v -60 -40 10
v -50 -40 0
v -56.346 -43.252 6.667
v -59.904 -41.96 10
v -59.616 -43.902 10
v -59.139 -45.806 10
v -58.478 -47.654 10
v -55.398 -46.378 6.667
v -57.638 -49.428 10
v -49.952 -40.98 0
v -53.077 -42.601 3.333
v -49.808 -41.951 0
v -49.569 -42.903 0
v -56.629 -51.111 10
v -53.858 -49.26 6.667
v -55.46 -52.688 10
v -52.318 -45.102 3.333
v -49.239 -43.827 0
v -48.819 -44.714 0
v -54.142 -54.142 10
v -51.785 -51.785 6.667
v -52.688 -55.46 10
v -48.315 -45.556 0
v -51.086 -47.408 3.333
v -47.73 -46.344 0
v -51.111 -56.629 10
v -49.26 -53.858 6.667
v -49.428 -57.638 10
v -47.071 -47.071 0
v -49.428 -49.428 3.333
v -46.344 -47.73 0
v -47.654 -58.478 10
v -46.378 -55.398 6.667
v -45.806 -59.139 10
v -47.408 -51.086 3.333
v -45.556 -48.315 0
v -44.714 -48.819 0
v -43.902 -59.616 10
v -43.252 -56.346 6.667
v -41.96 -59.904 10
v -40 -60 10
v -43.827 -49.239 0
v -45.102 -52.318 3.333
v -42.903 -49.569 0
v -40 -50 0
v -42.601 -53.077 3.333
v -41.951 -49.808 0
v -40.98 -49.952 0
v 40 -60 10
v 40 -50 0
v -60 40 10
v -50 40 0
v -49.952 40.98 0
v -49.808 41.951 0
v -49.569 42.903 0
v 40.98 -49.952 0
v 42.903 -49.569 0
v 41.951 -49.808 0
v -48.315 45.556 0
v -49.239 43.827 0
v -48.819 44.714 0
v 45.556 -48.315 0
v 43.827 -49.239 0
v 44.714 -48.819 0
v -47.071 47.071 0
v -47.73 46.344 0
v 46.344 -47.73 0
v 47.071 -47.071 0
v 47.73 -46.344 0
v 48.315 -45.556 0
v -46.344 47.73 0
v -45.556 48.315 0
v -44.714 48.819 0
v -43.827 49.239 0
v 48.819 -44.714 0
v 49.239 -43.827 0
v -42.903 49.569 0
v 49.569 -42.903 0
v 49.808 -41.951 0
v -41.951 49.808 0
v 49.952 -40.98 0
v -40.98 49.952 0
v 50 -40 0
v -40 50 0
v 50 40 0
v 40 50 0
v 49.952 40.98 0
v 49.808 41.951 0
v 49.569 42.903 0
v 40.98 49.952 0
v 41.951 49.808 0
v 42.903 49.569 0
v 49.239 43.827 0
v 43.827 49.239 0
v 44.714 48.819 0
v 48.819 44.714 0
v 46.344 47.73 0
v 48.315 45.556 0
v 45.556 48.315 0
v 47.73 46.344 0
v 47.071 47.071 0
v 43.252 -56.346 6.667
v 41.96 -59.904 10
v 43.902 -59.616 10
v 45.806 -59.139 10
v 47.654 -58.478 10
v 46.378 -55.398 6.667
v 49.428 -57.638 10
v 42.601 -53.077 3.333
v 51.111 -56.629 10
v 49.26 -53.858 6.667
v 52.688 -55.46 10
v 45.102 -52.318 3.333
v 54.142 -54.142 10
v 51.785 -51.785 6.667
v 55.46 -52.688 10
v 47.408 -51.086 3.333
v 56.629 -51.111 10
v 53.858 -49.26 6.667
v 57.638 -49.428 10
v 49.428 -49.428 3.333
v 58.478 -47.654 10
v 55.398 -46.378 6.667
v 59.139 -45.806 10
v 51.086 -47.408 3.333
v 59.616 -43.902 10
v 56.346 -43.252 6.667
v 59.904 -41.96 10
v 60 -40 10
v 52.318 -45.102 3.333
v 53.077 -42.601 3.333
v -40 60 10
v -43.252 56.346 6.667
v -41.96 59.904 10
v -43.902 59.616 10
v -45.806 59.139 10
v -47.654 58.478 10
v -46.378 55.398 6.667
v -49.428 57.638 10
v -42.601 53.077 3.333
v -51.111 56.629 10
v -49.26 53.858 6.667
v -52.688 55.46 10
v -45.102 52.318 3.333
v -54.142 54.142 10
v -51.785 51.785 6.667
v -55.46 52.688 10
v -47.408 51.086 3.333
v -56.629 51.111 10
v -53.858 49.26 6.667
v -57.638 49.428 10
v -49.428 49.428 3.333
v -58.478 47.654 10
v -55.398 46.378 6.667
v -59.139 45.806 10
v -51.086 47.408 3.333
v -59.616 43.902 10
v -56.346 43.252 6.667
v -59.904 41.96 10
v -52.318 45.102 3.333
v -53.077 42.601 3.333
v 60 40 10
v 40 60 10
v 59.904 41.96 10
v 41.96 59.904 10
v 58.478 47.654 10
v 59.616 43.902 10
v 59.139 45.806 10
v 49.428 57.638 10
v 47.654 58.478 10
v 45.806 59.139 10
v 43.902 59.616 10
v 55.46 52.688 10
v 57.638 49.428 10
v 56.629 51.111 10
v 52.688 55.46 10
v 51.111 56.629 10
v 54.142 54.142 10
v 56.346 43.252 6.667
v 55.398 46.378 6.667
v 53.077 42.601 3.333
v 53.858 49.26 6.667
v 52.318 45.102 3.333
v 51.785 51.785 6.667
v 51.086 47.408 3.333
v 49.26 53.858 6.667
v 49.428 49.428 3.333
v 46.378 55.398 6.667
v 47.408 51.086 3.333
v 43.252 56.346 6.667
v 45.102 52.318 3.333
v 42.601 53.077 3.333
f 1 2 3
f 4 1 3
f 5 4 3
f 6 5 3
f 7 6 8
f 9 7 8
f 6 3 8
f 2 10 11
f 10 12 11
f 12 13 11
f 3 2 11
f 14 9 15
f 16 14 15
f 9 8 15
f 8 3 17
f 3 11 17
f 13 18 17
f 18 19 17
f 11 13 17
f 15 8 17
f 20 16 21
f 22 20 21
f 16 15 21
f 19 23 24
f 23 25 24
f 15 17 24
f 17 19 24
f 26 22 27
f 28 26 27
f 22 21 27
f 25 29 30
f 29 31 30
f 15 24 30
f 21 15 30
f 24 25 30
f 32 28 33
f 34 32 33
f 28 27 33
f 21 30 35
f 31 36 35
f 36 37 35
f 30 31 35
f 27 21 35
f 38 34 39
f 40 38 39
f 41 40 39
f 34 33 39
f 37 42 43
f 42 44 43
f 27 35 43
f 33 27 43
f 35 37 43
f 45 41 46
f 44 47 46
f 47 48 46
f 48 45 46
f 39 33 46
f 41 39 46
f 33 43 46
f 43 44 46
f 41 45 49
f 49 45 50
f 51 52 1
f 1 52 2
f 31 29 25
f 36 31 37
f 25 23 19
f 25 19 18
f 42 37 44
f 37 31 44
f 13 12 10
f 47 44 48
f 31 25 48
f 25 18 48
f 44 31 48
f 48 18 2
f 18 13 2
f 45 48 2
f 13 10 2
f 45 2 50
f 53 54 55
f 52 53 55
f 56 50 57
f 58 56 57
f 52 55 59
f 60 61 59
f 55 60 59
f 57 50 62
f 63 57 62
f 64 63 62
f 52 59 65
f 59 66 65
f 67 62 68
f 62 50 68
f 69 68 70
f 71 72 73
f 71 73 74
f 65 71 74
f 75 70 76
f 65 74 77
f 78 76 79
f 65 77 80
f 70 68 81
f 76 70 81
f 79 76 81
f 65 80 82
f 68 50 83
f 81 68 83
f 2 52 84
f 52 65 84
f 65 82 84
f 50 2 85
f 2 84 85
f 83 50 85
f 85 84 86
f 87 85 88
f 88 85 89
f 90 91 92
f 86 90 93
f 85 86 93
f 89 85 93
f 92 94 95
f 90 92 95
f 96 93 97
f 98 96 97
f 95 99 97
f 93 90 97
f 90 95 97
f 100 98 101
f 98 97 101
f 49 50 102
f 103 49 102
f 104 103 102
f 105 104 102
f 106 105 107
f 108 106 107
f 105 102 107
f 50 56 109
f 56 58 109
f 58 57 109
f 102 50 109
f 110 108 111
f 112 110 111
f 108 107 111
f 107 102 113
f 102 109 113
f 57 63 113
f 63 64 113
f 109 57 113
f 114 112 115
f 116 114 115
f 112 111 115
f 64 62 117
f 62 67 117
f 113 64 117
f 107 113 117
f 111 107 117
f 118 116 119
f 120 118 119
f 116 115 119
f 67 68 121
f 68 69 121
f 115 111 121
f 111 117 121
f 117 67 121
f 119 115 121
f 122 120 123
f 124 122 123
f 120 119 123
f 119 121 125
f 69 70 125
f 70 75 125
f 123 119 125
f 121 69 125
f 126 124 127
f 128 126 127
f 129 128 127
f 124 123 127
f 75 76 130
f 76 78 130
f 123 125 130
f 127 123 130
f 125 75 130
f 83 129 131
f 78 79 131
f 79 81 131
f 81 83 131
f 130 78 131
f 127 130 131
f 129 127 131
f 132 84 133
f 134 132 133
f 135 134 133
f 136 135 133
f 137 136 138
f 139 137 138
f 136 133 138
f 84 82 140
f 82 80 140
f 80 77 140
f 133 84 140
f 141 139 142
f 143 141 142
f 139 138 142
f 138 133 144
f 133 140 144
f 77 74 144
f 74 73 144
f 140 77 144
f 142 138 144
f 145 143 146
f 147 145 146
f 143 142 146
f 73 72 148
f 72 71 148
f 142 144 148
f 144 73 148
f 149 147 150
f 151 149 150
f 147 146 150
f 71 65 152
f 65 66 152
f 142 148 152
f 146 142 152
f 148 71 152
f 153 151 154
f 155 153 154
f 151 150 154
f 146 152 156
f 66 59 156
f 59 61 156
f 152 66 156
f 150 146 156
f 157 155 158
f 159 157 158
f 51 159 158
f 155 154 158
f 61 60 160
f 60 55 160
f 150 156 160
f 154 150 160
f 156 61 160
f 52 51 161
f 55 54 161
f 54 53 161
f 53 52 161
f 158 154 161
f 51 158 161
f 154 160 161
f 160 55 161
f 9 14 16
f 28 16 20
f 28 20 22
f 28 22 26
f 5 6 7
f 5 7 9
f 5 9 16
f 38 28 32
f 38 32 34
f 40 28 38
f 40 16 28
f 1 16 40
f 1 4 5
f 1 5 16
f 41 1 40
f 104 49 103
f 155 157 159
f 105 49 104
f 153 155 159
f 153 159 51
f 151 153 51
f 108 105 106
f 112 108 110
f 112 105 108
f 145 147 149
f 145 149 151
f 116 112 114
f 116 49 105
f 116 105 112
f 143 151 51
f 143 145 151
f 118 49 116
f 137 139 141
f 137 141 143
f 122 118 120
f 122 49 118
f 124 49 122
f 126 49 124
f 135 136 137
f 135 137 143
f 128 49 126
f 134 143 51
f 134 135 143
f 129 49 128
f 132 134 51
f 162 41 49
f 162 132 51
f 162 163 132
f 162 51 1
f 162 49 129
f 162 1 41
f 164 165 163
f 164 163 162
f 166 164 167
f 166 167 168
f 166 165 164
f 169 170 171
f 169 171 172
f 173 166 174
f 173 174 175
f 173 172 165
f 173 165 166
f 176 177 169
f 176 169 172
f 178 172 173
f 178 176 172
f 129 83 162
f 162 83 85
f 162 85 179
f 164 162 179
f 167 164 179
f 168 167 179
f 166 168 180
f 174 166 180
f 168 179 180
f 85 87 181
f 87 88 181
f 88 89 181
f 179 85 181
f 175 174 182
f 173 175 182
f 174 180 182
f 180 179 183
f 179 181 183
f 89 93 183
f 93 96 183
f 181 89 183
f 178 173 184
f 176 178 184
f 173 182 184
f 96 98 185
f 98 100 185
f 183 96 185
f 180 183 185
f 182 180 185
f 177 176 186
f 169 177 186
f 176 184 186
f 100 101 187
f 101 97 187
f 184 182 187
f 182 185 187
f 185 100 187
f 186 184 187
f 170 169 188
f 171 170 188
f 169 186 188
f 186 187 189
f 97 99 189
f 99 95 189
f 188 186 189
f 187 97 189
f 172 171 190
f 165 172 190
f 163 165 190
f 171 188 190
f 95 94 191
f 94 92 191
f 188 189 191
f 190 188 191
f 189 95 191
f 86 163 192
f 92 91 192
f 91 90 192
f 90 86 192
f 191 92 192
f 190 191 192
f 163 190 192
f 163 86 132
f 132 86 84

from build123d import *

# Parameters (mm, degrees)
F1_DEPTH = 10
F2_SIZE  = 9.99999


# Not quite as in the source:
# - a fillet or chamfer is up to 0.001 mm smaller than in the source, because OpenCascade refuses the exact size


with BuildPart() as f1:
    # F0 (on Top) → F1 (new body)
    with BuildSketch(Plane.XY):
        with BuildLine():
            Line((-40, -60), (40, -60))
            ThreePointArc((40, -60), (54.1421356237, -54.1421356237), (60, -40))
            Line((60, -40), (60, 40))
            ThreePointArc((60, 40), (54.1421356237, 54.1421356237), (40, 60))
            Line((40, 60), (-40, 60))
            ThreePointArc((-40, 60), (-54.1421356237, 54.1421356237), (-60, 40))
            Line((-60, 40), (-60, -40))
            ThreePointArc((-60, -40), (-54.1421356237, -54.1421356237), (-40, -60))
        make_face()
    extrude(amount=F1_DEPTH)

    # F2 (size 10 in the source; OpenCascade refuses exactly that, so slightly less here)
    f2_edges = [f1.edges().sort_by_distance(p)[0] for p in [
        (-60, 0, 0),
    ]]
    chamfer(f2_edges, length=F2_SIZE)


solid = f1.part
